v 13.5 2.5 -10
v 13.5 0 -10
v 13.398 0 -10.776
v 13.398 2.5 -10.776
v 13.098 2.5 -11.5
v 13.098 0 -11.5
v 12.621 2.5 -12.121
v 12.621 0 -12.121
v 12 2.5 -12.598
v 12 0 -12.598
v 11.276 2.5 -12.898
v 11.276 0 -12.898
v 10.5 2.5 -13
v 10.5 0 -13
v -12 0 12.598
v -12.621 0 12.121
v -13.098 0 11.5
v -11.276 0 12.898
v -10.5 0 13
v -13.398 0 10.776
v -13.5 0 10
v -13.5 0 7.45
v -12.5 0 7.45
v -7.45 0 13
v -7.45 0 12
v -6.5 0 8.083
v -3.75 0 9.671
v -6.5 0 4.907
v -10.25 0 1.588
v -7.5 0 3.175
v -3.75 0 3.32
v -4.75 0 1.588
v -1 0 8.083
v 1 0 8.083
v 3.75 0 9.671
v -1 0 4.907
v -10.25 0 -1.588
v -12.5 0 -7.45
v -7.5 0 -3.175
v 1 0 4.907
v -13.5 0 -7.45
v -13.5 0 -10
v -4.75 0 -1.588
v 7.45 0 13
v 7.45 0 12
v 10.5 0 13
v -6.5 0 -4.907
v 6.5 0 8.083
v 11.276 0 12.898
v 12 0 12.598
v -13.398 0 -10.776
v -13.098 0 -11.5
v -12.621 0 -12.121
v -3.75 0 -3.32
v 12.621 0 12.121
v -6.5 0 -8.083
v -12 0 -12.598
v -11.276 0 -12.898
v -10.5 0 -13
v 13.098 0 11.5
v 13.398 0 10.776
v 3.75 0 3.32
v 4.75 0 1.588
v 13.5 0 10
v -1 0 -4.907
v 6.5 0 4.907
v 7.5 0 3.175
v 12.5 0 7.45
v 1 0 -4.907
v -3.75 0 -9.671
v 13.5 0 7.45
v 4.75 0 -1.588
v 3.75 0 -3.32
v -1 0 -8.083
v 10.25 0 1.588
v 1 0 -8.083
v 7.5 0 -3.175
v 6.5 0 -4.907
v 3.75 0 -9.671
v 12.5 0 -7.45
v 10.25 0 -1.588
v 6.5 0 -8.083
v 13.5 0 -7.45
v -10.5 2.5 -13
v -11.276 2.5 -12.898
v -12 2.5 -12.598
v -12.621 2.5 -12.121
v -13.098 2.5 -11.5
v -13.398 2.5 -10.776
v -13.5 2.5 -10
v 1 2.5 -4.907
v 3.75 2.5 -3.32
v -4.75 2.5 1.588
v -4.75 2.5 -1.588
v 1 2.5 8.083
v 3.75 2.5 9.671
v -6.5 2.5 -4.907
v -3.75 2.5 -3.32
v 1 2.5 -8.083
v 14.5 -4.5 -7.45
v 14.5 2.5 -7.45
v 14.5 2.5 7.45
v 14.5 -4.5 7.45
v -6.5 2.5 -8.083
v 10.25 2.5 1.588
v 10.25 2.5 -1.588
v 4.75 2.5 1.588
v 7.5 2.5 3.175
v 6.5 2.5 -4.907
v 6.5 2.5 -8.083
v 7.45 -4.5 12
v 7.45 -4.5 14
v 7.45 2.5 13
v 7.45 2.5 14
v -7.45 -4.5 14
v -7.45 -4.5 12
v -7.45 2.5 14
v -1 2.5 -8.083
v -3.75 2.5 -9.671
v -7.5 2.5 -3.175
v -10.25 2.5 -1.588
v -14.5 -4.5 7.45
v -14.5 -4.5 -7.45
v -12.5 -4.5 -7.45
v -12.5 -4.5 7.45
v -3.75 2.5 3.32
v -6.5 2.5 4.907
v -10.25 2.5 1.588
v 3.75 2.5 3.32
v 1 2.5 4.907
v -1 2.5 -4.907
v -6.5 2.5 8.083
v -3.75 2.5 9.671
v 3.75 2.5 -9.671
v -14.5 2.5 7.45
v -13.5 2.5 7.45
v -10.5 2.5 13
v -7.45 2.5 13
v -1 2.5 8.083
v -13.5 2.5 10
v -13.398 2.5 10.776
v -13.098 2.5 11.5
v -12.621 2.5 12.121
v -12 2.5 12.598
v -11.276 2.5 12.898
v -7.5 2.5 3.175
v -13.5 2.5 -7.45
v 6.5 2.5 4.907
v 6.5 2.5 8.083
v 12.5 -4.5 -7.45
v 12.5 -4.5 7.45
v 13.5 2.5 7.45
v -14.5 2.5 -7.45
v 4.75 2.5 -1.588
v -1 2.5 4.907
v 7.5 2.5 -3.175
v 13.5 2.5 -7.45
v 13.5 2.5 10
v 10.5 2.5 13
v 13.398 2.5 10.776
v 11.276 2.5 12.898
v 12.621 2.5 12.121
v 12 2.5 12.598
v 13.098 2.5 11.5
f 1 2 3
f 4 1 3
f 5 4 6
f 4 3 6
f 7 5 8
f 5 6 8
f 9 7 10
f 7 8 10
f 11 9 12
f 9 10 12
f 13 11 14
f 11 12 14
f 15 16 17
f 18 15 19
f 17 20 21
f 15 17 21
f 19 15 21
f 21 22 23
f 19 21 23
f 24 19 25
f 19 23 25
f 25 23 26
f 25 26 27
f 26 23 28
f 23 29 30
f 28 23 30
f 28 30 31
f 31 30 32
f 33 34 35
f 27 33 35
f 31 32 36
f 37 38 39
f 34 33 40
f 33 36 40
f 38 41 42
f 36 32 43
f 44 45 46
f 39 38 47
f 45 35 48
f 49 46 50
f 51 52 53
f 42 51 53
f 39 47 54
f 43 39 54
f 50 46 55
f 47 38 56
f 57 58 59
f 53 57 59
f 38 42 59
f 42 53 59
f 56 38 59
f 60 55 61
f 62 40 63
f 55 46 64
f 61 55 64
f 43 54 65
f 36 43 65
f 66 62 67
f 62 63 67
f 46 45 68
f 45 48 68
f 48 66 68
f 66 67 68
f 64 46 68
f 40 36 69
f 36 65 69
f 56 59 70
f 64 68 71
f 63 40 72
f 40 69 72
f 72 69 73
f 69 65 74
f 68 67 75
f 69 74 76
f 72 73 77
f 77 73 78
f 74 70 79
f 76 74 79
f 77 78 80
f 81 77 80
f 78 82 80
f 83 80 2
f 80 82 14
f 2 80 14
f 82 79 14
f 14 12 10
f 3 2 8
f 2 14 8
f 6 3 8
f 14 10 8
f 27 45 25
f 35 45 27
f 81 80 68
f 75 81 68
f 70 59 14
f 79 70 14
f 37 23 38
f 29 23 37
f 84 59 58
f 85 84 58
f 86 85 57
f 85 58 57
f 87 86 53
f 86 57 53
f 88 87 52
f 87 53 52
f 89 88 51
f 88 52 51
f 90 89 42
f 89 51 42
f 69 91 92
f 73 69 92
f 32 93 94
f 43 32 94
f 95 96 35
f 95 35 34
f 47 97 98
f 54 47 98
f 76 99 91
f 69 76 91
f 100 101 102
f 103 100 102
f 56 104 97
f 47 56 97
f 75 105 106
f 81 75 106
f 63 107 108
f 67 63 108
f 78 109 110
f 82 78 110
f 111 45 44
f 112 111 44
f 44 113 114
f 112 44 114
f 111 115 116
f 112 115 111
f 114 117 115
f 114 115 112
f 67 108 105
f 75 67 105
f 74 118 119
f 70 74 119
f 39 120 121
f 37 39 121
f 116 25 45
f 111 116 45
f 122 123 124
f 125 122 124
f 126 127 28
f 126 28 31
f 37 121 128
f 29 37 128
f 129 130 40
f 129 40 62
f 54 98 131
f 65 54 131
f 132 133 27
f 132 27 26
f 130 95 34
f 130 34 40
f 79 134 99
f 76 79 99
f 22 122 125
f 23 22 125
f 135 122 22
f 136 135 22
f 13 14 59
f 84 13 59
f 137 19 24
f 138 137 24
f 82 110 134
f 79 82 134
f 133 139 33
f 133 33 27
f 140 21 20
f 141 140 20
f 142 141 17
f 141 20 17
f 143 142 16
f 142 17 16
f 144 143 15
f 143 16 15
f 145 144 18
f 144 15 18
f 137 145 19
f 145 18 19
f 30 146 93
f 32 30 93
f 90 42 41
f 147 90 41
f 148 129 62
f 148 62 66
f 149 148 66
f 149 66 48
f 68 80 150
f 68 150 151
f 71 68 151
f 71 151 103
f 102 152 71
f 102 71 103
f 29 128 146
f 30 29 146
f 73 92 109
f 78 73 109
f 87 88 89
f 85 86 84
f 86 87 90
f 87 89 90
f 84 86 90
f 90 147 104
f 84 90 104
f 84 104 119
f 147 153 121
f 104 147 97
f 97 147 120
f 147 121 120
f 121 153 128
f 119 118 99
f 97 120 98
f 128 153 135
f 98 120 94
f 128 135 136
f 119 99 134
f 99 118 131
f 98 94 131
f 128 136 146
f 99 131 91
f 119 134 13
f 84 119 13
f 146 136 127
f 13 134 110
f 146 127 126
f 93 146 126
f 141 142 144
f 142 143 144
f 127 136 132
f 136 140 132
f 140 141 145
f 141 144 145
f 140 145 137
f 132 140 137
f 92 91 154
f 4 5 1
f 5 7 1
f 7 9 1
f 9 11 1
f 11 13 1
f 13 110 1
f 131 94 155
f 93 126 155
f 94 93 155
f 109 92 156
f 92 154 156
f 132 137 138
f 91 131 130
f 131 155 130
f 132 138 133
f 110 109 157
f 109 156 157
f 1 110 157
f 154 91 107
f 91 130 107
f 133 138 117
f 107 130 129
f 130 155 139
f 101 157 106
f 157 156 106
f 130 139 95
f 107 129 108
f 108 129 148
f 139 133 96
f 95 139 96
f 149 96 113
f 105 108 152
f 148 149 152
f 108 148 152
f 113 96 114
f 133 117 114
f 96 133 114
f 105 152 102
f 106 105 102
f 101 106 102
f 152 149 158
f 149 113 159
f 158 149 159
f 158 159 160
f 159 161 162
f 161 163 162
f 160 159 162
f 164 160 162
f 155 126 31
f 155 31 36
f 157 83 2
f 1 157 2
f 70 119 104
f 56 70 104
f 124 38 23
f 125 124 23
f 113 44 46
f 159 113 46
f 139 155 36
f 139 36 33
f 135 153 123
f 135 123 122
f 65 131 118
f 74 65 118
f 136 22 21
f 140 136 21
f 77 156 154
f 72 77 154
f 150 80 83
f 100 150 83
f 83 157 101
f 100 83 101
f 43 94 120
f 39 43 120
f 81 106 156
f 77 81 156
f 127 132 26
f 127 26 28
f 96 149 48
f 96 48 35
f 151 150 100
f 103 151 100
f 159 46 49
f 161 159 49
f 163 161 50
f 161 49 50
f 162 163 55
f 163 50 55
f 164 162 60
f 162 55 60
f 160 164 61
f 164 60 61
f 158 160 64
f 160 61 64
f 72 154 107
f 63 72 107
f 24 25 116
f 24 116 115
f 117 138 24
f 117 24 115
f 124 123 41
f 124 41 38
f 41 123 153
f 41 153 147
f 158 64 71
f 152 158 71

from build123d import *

# Parameters (mm, degrees)
BOSS_EXTRUDE1_DEPTH      = 2.5
BOSS_EXTRUDE2_DEPTH      = 4.5
BOSS_EXTRUDE2_DEPTH_BACK = 2.5
SKETCH2_W                = 2
SKETCH2_H                = 14.9
SKETCH2_W_2              = 14.9
SKETCH2_H_2              = 2
CUT_EXTRUDE1_DEPTH       = 10


with BuildPart() as part:
    # Sketch1 → Boss-Extrude1 (new body)
    with BuildSketch(Plane(origin=(0, 0, 0), x_dir=(1, 0, 0), z_dir=(0, 1, 0))):
        with BuildLine():
            Line((-10.5, -13), (10.5, -13))
            ThreePointArc((10.5, -13), (12.621320344, -12.121320344), (13.5, -10))
            Line((13.5, -10), (13.5, 10))
            ThreePointArc((13.5, 10), (12.621320344, 12.121320344), (10.5, 13))
            Line((10.5, 13), (-10.5, 13))
            ThreePointArc((-10.5, 13), (-12.621320344, 12.121320344), (-13.5, 10))
            Line((-13.5, 10), (-13.5, -10))
            ThreePointArc((-13.5, -10), (-12.621320344, -12.121320344), (-10.5, -13))
        make_face()
    extrude(amount=BOSS_EXTRUDE1_DEPTH)

    # Sketch2 → Boss-Extrude2 (add, two sides: drawn at the far end of the back side and taken through both)
    with BuildSketch(Plane.XZ.offset(-BOSS_EXTRUDE2_DEPTH_BACK)):
        with Locations((-13.5, 0)):
            Rectangle(SKETCH2_W, SKETCH2_H)
        with Locations((13.5, 0)):
            Rectangle(SKETCH2_W, SKETCH2_H)
        with Locations((0, 13)):
            Rectangle(SKETCH2_W_2, SKETCH2_H_2)
    extrude(amount=BOSS_EXTRUDE2_DEPTH + BOSS_EXTRUDE2_DEPTH_BACK)

    # Sketch3 → Cut-Extrude1 (cut)
    with BuildSketch(Plane(origin=(0, 2.5, 0), x_dir=(1, 0, 0), z_dir=(0, 1, 0))):
        Polygon((1, -4.907477288), (3.75, -3.319764048), (6.5, -4.907477288), (6.5, -8.082903769), (3.75, -9.670617009), (1, -8.082903769), align=None)
        Polygon((-3.75, 3.319764048), (-1, 4.907477288), (-1, 8.082903769), (-3.75, 9.670617009), (-6.5, 8.082903769), (-6.5, 4.907477288), align=None)
        Polygon((-7.5, -3.175426481), (-4.75, -1.58771324), (-4.75, 1.58771324), (-7.5, 3.175426481), (-10.25, 1.58771324), (-10.25, -1.58771324), align=None)
        Polygon((7.5, -3.175426481), (10.25, -1.58771324), (10.25, 1.58771324), (7.5, 3.175426481), (4.75, 1.58771324), (4.75, -1.58771324), align=None)
        Polygon((3.75, 3.319764048), (6.5, 4.907477288), (6.5, 8.082903769), (3.75, 9.670617009), (1, 8.082903769), (1, 4.907477288), align=None)
        Polygon((-6.5, -4.907477288), (-3.75, -3.319764048), (-1, -4.907477288), (-1, -8.082903769), (-3.75, -9.670617009), (-6.5, -8.082903769), align=None)
    extrude(amount=-CUT_EXTRUDE1_DEPTH, mode=Mode.SUBTRACT)


solid = part.part
